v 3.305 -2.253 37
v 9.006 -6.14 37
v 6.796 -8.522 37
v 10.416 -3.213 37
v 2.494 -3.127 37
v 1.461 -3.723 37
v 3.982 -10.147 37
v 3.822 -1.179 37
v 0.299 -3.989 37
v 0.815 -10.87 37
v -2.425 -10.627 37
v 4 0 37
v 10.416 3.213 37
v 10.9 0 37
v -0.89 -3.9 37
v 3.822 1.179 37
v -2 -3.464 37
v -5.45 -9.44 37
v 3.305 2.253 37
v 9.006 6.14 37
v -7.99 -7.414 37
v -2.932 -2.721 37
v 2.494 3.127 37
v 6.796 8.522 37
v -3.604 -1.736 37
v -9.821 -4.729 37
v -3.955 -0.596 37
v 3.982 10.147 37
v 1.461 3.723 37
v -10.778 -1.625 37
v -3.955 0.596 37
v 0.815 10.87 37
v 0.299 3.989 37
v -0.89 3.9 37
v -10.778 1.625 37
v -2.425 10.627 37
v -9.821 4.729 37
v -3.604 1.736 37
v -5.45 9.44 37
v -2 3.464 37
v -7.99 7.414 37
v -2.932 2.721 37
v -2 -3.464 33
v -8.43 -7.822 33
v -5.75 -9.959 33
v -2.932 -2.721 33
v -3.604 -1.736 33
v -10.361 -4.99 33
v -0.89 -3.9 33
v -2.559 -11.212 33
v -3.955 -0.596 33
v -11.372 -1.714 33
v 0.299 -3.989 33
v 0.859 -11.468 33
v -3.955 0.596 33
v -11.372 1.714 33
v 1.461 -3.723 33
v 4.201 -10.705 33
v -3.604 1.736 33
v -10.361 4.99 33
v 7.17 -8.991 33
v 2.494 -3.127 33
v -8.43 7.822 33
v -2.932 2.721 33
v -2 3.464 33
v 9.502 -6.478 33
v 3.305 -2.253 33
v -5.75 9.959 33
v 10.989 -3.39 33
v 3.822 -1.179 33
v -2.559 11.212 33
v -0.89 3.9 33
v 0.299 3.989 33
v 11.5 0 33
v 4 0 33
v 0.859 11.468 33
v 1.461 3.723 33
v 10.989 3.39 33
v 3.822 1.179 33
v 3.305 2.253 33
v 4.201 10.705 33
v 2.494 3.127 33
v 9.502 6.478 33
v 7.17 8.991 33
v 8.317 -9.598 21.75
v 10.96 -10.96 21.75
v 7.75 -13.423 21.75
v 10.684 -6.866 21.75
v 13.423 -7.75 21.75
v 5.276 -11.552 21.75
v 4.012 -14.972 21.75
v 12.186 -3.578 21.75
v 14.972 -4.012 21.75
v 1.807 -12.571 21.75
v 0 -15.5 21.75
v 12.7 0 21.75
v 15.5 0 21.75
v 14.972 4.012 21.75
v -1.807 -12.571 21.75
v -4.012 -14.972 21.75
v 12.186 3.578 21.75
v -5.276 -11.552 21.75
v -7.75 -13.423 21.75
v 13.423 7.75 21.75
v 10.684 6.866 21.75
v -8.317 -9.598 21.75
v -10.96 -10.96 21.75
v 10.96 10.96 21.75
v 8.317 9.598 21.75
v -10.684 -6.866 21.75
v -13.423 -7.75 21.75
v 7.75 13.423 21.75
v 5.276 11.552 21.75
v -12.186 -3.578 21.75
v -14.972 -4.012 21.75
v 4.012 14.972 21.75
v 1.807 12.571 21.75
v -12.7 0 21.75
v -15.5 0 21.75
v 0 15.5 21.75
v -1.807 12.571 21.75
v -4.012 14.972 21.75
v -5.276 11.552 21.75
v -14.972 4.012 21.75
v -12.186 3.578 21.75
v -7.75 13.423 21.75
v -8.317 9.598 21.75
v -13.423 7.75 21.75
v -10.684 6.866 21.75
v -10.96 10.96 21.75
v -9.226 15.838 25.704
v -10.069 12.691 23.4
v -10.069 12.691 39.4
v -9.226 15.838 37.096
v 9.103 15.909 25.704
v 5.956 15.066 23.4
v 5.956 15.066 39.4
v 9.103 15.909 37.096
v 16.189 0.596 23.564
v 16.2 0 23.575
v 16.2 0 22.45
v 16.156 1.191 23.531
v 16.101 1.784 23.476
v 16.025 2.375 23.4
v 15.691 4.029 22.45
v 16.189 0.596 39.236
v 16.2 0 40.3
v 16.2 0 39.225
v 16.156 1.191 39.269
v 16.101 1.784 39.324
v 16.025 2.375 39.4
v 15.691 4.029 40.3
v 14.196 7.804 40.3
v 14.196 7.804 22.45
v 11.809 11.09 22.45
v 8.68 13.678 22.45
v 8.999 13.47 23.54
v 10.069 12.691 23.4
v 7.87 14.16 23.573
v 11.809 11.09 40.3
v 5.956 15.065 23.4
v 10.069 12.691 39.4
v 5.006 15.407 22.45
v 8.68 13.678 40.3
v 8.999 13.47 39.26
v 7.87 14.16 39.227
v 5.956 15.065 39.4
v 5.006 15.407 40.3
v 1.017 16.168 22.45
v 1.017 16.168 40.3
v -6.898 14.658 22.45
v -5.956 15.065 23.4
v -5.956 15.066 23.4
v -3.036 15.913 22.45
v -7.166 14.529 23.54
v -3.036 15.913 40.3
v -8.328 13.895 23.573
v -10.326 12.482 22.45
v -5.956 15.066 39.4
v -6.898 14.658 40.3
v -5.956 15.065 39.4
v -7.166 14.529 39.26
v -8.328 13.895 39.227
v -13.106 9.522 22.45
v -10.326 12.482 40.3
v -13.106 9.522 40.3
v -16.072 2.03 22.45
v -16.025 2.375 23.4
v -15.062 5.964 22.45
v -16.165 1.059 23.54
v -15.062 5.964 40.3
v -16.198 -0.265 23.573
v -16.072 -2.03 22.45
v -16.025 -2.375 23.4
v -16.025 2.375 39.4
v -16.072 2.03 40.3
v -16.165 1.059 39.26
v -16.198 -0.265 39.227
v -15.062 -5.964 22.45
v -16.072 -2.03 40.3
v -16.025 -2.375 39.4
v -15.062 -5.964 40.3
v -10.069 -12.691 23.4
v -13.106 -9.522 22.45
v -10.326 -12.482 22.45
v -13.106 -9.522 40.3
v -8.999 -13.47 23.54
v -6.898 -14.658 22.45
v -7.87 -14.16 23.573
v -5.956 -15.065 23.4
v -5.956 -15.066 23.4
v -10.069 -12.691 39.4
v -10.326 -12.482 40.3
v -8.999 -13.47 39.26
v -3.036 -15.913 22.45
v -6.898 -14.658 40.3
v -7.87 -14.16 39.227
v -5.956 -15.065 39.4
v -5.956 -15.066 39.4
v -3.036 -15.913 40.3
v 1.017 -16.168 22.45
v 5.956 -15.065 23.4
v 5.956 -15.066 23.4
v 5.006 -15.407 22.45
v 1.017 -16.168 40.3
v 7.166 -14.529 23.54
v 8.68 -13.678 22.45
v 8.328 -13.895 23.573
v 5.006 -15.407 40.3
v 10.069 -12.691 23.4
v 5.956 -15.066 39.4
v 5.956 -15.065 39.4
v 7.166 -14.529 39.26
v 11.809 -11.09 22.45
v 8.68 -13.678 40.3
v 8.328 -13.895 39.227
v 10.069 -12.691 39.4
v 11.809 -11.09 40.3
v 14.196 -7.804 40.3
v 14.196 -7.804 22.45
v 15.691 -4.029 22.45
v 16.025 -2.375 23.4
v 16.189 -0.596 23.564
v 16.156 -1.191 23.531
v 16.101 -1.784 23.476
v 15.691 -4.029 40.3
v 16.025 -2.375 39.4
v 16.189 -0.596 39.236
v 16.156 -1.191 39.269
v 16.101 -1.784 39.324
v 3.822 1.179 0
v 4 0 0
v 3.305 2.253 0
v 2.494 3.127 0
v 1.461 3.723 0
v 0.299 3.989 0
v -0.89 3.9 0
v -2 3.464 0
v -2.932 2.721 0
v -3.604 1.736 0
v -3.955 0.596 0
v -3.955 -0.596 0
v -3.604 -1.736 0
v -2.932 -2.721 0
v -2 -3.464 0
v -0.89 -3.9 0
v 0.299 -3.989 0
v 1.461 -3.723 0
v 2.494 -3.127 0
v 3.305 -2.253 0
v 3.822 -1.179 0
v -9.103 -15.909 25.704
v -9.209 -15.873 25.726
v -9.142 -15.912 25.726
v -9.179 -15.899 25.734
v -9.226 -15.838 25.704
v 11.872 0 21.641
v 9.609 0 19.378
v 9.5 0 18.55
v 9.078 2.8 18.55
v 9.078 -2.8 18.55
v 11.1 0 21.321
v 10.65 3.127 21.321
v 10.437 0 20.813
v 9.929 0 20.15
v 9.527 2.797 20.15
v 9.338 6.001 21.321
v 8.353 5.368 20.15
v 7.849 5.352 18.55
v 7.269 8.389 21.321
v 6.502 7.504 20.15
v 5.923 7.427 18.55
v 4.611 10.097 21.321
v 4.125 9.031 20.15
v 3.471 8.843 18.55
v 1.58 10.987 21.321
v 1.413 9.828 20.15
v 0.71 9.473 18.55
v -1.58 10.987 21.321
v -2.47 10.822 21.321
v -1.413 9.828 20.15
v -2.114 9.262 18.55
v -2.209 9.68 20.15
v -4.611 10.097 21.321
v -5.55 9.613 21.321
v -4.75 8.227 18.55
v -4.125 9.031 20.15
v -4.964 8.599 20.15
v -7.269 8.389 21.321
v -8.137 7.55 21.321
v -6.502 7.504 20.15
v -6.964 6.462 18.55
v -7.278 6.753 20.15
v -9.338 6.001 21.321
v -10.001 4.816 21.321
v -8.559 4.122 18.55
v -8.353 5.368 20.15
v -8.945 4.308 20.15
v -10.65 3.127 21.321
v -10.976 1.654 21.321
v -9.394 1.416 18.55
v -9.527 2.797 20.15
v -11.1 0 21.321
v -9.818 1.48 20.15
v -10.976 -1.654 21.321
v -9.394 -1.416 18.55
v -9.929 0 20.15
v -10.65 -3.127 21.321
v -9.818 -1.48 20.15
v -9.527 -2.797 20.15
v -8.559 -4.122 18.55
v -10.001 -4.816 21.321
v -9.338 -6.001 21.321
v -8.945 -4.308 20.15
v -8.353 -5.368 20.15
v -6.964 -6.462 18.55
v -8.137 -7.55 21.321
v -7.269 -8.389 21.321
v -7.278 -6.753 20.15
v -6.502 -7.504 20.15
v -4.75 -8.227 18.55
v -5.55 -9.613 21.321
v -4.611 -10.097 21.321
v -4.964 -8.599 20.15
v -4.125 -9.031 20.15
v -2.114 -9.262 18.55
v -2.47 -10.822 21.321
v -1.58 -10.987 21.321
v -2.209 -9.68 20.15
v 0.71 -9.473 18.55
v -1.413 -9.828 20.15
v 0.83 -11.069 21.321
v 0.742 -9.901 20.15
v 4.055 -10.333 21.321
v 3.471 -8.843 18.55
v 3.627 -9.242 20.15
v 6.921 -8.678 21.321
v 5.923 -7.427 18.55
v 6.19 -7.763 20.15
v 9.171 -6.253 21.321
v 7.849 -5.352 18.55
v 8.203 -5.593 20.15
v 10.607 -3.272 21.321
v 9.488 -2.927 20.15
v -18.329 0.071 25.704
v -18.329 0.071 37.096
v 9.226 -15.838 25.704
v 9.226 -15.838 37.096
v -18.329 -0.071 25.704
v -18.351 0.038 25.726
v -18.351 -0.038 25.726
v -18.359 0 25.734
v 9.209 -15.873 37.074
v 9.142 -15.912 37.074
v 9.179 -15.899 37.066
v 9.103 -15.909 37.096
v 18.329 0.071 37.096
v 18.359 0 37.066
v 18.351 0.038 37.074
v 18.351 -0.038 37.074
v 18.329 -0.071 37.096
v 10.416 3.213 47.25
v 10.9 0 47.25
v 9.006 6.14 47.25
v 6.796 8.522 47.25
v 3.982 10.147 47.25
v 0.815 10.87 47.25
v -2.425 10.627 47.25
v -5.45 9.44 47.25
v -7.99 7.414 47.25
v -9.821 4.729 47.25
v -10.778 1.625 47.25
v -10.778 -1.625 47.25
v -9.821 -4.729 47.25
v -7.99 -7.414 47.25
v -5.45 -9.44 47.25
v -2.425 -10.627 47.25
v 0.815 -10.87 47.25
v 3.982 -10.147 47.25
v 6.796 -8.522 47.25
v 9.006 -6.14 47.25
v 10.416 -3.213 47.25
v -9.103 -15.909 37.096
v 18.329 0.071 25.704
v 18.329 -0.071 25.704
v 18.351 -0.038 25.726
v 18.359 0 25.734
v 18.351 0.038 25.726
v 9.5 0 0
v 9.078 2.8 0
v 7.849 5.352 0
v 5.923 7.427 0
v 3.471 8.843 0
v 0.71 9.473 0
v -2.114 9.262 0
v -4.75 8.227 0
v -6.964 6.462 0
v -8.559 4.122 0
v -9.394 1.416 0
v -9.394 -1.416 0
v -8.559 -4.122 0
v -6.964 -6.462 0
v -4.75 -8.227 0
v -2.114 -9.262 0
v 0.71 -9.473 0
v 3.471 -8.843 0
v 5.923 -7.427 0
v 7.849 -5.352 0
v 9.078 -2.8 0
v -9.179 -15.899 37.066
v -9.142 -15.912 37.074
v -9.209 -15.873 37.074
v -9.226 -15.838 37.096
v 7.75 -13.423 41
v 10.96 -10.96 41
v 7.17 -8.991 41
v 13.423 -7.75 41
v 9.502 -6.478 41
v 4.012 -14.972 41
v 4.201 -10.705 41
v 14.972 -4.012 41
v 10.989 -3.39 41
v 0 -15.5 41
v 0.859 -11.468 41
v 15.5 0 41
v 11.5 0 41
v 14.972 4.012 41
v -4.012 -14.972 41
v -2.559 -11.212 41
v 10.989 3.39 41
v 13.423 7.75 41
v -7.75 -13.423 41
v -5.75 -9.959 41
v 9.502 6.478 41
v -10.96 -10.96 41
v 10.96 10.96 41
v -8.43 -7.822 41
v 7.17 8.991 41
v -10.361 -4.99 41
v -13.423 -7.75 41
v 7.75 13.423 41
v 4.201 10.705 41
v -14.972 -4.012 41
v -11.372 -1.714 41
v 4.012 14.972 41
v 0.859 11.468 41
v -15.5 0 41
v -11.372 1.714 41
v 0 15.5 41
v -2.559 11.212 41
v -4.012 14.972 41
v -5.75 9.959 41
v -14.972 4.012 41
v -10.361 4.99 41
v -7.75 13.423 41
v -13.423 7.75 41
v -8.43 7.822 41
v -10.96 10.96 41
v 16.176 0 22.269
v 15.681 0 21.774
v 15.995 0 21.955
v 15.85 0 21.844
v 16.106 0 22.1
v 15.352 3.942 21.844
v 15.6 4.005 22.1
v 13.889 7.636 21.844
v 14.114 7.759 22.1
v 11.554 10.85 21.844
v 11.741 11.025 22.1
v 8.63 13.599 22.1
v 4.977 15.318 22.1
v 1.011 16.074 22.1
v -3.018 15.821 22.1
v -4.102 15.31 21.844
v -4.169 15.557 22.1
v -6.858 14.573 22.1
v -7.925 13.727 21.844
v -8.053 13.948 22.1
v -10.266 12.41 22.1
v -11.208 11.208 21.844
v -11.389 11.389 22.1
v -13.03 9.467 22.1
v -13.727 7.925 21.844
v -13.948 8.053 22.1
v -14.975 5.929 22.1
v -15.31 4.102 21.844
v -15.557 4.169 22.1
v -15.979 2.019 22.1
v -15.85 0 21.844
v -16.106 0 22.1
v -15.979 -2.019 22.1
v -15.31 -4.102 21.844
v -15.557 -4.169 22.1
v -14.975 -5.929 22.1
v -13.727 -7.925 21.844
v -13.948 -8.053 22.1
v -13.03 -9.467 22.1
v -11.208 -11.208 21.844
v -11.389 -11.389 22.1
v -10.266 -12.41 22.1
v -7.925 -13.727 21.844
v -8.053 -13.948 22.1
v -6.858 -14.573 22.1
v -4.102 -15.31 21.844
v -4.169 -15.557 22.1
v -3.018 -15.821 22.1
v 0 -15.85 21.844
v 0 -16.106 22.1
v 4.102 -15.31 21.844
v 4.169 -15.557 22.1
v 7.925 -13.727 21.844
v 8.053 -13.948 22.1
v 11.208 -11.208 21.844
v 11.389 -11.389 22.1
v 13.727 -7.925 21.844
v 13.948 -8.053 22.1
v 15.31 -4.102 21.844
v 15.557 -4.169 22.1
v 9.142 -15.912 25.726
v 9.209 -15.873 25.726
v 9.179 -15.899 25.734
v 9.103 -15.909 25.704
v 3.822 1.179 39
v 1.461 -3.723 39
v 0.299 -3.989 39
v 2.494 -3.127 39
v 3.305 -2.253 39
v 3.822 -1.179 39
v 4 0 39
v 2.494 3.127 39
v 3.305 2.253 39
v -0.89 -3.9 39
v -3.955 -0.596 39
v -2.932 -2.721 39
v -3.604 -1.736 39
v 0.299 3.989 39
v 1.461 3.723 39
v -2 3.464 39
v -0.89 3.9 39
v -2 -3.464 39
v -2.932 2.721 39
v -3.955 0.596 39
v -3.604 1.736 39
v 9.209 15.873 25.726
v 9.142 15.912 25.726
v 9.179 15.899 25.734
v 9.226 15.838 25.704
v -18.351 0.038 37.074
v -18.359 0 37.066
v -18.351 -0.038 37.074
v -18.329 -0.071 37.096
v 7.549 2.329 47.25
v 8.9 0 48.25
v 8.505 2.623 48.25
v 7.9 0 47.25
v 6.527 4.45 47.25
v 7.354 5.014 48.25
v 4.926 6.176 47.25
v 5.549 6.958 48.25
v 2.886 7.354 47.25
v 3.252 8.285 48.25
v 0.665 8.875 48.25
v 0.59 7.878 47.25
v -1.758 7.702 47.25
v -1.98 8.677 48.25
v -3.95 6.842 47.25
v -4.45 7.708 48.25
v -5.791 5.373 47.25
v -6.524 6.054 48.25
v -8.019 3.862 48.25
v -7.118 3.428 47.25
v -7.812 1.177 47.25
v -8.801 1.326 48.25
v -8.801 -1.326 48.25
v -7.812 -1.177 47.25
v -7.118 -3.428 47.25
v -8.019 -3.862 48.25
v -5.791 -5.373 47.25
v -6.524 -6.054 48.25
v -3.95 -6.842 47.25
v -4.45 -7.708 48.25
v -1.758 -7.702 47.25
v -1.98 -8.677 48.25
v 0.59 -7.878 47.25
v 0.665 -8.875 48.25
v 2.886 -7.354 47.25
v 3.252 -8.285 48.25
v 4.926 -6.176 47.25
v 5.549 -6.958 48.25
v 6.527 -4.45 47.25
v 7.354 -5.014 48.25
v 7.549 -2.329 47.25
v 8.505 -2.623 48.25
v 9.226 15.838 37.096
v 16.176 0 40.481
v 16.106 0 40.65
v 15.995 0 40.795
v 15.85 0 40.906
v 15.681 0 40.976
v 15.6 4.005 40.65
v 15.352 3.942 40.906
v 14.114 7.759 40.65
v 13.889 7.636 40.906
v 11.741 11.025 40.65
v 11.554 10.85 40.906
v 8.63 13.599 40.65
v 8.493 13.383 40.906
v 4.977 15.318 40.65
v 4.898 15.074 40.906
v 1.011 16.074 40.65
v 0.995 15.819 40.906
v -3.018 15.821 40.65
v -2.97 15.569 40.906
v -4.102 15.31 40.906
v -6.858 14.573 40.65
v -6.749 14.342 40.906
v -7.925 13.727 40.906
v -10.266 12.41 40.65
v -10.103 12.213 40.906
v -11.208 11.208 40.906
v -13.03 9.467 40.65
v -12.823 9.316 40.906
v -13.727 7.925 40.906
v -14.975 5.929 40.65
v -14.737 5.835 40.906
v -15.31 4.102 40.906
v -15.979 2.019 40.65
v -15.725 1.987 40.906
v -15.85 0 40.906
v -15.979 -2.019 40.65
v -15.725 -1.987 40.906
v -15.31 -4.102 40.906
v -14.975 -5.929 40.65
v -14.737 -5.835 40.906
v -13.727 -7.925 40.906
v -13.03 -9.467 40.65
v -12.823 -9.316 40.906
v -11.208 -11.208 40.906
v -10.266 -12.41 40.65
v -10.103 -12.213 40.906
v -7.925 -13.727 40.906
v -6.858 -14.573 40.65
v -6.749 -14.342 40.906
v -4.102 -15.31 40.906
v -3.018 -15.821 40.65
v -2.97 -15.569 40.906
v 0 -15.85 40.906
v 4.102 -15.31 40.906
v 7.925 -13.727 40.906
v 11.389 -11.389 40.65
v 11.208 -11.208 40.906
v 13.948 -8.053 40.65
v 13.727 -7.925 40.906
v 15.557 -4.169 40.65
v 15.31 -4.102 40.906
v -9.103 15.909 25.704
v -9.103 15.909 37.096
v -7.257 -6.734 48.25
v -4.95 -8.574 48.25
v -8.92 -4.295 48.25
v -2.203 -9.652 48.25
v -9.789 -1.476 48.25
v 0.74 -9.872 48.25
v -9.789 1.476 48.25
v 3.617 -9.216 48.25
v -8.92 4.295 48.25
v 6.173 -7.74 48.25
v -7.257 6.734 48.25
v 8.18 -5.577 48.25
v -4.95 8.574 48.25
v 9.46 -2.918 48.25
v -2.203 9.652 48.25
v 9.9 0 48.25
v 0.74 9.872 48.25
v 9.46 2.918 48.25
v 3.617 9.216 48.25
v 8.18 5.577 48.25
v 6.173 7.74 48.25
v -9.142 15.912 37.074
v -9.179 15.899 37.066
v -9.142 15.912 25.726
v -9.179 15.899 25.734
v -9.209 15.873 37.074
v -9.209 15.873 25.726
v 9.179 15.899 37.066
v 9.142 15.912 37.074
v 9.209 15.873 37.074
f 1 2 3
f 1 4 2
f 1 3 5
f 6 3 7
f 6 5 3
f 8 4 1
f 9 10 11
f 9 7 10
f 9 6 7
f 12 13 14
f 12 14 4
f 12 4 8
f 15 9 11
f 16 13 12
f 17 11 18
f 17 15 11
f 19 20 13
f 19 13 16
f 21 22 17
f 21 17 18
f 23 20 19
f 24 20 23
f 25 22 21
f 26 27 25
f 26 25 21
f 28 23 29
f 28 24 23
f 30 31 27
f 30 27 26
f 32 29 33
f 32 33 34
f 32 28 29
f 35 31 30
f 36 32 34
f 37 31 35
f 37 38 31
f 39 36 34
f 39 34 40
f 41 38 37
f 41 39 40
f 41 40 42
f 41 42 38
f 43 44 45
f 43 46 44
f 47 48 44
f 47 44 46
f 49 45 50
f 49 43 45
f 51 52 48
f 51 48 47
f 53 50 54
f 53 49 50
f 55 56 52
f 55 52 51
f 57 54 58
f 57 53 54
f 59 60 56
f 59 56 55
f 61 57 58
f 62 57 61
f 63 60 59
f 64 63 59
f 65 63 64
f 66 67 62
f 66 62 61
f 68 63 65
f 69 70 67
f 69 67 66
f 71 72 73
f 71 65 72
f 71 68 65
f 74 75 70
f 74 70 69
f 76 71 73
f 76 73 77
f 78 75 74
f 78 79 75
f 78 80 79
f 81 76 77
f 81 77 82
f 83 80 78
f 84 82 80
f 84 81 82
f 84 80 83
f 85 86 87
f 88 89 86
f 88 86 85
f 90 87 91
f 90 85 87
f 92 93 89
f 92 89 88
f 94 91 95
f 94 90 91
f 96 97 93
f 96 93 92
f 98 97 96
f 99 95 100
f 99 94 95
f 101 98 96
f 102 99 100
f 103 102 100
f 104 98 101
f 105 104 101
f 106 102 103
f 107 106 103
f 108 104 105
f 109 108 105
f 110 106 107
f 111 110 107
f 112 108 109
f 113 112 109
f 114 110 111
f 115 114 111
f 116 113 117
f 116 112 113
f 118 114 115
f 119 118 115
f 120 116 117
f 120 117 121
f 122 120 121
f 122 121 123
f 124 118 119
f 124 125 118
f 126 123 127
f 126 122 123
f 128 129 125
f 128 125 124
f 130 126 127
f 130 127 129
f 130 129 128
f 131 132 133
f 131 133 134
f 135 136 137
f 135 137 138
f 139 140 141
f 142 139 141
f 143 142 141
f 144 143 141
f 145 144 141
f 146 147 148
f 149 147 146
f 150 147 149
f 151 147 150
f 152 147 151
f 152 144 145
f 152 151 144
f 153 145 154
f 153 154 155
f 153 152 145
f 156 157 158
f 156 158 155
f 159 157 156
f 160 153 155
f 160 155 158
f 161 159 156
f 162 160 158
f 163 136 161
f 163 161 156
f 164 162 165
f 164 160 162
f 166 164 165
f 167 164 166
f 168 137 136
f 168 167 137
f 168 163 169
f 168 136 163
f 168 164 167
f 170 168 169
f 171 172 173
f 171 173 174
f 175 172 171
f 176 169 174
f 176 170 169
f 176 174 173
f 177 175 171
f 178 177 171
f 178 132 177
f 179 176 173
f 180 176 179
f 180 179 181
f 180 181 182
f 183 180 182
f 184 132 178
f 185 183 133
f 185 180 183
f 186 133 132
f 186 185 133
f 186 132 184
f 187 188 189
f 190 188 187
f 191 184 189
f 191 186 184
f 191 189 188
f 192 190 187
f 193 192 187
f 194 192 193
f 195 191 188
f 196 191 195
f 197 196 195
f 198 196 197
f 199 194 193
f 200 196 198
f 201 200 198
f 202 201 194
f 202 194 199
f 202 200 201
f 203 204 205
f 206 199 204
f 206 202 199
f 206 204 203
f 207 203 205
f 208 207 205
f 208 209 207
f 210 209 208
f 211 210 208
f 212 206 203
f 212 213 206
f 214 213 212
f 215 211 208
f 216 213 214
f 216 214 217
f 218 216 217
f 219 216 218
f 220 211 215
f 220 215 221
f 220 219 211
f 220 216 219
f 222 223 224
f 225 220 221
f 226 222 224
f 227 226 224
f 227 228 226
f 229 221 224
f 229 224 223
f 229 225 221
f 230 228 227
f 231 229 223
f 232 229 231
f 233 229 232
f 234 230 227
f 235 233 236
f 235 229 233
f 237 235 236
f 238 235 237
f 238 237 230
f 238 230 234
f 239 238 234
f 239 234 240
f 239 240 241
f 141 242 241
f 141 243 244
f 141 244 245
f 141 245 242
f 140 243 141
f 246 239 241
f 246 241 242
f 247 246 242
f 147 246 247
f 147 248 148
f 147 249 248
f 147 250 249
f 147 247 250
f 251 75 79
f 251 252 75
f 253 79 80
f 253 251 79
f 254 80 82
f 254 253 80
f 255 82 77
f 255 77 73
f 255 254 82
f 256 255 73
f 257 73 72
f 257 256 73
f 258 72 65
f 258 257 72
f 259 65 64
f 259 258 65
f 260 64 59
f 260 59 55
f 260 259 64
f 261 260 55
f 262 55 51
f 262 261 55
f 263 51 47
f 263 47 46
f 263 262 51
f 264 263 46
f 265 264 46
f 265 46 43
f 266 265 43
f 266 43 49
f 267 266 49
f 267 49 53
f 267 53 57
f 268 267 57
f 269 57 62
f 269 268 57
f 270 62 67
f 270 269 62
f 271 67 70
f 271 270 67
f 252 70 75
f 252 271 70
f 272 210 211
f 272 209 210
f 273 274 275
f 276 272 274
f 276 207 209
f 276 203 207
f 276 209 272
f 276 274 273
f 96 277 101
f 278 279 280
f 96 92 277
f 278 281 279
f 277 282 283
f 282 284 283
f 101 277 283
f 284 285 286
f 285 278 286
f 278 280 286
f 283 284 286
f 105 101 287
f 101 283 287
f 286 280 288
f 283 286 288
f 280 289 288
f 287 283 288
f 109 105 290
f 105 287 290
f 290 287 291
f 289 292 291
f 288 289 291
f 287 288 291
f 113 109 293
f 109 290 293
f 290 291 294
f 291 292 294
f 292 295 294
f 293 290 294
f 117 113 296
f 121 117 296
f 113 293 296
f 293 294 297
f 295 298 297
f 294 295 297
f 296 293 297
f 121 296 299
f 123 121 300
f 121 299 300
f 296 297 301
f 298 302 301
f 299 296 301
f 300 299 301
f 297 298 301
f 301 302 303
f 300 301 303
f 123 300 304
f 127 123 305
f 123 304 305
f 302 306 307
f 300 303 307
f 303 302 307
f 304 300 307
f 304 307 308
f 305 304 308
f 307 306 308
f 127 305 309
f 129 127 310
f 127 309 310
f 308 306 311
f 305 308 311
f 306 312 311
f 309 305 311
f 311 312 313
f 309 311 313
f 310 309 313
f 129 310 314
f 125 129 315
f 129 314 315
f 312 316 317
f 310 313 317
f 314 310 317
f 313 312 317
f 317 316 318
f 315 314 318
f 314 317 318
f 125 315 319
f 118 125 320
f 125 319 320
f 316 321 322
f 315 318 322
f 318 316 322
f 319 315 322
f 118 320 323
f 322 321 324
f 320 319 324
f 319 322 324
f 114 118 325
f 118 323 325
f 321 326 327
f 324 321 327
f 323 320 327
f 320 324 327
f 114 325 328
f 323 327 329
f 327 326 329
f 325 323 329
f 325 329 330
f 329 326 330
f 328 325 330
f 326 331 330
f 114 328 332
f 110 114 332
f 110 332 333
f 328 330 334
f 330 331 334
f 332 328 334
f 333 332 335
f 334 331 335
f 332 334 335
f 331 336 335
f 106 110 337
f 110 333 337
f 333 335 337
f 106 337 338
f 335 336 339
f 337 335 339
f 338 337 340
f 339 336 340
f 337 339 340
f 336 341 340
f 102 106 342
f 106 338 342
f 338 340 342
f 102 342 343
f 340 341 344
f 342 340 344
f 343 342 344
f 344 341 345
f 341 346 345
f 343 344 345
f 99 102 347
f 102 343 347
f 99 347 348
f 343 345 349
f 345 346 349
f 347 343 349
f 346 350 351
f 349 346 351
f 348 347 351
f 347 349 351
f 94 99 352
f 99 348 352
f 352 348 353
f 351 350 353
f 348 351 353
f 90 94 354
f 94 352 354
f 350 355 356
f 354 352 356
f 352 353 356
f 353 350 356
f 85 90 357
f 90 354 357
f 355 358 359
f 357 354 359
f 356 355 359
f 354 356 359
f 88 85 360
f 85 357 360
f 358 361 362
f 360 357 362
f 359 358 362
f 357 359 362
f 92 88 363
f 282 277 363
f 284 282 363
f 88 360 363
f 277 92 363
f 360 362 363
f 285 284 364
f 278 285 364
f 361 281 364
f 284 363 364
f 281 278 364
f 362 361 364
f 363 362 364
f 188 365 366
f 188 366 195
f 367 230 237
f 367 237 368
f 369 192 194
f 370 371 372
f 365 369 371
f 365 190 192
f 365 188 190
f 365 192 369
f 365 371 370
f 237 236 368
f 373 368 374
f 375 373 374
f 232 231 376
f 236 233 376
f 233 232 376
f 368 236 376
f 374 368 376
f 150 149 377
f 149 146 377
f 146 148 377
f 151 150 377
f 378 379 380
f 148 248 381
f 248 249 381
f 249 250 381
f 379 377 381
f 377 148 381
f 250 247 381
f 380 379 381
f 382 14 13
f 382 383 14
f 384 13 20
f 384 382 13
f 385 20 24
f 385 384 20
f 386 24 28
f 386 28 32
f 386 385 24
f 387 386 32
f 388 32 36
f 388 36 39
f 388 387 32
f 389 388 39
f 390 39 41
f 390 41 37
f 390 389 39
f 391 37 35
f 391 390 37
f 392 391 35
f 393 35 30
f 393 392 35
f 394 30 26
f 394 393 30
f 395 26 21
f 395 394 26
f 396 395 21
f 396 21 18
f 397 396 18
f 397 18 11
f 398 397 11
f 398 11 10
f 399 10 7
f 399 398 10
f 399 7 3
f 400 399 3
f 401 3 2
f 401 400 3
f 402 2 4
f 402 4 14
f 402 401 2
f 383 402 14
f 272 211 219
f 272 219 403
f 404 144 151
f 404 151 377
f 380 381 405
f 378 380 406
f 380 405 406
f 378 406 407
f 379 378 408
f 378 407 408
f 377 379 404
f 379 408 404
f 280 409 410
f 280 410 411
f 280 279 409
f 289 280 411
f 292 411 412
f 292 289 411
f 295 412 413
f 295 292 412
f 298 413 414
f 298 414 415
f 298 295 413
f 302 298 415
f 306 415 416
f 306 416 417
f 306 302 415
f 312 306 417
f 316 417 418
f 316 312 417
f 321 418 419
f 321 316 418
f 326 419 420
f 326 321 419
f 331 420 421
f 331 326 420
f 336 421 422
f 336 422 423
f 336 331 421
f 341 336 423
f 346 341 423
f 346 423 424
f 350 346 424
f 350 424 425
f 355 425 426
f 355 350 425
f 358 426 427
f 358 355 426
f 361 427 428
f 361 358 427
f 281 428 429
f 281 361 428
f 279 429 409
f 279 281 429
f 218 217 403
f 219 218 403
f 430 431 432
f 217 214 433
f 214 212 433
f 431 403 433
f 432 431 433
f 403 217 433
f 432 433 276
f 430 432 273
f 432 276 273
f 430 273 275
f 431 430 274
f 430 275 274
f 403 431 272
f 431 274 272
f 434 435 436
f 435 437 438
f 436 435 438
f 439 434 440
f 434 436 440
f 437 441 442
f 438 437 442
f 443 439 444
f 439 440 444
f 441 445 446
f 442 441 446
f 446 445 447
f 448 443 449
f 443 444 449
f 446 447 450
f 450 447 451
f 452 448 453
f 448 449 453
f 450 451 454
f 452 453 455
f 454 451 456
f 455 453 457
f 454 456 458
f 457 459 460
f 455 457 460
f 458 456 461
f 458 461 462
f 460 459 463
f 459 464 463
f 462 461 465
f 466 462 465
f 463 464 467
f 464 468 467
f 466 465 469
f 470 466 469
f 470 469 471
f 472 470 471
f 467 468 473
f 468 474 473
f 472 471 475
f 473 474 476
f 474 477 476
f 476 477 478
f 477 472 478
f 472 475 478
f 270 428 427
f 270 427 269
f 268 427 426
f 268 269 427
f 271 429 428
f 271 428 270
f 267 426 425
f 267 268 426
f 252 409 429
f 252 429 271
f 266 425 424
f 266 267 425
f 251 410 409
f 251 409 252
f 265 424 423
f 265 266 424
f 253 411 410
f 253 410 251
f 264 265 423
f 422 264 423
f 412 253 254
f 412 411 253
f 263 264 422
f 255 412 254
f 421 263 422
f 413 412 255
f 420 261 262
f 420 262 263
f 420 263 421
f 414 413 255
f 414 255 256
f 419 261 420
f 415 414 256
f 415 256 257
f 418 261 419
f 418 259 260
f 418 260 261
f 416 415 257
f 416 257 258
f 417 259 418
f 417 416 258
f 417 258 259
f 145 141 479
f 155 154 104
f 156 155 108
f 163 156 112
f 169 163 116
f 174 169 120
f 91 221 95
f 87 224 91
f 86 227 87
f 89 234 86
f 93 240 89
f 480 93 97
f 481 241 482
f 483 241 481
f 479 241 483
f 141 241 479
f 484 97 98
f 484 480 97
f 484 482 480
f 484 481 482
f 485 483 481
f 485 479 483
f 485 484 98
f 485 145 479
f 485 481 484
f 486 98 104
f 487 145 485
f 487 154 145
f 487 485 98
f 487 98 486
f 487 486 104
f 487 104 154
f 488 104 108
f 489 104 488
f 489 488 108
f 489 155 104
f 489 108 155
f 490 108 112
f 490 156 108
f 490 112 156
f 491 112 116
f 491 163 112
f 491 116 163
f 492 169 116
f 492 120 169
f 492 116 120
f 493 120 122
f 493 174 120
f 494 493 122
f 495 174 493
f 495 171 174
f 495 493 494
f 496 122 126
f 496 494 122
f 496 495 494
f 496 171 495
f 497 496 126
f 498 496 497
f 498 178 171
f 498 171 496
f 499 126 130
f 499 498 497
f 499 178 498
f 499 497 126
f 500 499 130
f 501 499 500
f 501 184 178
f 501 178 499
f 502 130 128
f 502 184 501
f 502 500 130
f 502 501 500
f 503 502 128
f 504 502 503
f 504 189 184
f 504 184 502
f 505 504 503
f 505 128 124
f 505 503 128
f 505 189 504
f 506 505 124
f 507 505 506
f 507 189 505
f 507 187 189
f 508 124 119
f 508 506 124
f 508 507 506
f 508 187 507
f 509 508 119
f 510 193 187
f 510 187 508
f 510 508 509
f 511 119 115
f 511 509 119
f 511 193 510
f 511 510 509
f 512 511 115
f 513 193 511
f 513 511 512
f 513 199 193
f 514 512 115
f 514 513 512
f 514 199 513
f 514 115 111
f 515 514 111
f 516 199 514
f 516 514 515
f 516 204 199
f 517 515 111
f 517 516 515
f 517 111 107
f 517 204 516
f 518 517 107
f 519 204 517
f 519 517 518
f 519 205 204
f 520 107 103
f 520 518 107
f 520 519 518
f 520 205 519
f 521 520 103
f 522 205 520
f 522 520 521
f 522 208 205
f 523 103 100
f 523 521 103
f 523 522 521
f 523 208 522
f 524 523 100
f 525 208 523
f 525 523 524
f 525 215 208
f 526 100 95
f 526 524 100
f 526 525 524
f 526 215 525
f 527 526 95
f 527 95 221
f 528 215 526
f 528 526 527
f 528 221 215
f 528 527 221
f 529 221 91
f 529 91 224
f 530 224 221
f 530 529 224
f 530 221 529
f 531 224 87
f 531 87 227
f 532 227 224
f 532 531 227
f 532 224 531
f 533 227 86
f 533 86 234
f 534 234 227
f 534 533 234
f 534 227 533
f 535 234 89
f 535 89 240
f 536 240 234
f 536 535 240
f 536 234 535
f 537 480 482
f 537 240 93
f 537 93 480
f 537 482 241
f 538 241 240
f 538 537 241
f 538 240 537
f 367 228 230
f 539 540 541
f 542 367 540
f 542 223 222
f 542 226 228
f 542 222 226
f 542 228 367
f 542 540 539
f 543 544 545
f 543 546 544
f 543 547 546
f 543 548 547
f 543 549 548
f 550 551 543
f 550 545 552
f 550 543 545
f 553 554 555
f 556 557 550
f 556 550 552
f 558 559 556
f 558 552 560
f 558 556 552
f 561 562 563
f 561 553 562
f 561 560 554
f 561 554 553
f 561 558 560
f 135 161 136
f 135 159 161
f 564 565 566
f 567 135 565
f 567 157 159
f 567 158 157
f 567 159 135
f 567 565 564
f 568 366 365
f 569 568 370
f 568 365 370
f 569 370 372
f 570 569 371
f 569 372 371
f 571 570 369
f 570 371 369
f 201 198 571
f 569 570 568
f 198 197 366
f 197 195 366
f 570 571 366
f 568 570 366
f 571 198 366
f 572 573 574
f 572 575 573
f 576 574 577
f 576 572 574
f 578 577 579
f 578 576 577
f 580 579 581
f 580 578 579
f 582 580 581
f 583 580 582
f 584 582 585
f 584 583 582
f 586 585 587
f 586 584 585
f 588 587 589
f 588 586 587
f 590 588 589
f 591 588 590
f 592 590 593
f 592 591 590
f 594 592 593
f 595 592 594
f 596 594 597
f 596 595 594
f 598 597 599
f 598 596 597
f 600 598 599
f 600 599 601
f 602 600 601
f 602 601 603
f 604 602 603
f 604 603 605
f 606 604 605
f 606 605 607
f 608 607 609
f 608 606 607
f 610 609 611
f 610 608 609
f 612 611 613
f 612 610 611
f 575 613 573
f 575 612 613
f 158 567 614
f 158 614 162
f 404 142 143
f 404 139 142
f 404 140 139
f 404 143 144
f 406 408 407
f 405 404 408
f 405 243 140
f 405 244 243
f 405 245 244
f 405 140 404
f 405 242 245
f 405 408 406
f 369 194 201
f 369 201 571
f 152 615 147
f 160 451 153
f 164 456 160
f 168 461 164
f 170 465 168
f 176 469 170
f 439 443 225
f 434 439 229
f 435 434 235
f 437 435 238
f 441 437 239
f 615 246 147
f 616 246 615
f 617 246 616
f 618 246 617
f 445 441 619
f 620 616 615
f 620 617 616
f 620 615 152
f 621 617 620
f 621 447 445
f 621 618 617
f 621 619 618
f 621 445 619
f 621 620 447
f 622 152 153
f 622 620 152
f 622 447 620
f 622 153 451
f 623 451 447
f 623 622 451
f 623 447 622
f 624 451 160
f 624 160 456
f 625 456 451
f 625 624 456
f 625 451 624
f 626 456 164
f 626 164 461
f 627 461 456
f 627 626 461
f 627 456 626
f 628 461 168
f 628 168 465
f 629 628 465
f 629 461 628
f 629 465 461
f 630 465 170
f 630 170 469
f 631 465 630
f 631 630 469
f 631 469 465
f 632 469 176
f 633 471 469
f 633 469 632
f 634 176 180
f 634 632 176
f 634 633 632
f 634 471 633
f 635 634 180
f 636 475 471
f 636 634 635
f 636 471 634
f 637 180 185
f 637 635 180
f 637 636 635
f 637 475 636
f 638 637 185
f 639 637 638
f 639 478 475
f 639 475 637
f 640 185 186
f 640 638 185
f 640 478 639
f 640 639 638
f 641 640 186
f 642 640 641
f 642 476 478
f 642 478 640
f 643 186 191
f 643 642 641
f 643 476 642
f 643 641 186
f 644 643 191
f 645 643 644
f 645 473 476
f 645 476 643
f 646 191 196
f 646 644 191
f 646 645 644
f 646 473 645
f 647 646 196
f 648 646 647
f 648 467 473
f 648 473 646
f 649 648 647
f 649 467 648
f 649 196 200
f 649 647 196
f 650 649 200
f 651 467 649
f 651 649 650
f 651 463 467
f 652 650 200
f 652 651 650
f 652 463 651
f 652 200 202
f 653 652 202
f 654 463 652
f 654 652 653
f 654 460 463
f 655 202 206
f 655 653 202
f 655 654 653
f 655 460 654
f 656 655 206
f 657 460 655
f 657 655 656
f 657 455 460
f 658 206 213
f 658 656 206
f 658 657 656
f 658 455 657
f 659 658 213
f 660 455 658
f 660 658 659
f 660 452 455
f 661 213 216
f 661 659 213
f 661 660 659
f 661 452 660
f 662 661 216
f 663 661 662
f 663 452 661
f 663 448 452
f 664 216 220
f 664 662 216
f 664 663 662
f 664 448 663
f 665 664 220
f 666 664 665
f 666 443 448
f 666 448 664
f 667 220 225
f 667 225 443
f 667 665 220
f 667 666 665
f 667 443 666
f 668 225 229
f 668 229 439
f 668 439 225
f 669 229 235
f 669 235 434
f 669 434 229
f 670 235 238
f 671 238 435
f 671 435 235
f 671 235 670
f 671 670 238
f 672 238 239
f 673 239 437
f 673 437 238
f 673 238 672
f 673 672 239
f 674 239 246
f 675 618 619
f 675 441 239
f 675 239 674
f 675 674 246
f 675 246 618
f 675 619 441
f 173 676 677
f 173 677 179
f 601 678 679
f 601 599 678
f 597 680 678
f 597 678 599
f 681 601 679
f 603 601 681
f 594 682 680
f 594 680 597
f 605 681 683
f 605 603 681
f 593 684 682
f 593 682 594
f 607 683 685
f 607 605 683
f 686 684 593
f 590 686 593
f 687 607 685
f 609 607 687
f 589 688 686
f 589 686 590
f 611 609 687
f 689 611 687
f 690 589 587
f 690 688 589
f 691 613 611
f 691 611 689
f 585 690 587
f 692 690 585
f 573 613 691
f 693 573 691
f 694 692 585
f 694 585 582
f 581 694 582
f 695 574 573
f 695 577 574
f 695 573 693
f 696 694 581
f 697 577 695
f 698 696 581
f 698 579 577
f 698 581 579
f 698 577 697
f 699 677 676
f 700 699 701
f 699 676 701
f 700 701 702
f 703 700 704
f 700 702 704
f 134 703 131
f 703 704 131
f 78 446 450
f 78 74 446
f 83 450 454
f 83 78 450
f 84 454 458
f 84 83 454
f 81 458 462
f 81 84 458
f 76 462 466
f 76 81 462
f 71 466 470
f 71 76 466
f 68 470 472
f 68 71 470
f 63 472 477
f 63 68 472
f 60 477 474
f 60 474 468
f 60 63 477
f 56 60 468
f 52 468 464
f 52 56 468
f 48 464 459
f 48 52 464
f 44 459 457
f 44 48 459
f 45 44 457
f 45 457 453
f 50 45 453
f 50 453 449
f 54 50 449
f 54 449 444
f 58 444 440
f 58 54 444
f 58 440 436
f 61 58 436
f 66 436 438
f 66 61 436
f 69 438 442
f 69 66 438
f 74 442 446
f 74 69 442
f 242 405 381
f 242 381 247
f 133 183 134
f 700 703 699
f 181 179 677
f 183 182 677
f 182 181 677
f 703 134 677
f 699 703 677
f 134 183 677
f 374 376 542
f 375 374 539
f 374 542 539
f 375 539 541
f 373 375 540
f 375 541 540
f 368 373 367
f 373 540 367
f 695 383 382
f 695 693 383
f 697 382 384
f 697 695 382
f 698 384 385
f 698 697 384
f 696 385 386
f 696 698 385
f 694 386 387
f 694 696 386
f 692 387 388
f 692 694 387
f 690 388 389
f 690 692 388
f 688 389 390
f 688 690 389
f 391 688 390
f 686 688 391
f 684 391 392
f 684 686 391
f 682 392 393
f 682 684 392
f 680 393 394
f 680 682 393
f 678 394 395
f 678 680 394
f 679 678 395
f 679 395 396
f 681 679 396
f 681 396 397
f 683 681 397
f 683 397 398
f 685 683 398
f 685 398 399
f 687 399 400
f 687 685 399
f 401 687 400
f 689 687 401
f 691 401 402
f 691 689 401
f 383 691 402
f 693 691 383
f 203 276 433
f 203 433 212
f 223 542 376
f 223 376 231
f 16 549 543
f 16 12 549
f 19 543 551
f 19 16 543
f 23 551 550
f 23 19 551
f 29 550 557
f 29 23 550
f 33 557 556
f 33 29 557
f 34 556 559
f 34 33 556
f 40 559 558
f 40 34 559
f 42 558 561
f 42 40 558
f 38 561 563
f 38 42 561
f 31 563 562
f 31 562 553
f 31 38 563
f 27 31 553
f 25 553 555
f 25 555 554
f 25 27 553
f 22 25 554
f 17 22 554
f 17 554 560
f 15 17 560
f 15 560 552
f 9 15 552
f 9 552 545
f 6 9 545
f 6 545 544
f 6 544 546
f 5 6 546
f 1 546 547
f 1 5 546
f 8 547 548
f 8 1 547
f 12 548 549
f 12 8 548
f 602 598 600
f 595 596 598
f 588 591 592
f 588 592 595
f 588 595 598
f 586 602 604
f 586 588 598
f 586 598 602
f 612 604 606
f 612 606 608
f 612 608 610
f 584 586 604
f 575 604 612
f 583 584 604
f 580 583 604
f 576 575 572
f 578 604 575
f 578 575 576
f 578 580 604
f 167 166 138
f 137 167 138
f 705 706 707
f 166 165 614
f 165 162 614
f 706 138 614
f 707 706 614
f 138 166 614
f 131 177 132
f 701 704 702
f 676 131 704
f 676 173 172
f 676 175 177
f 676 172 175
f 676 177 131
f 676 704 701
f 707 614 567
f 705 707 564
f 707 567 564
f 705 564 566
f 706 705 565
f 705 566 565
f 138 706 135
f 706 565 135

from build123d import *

# Parameters (mm, degrees)
PAD001_DEPTH      = 3
PAD001_DEPTH_BACK = 3
PAD_DEPTH         = 16
ARRAY_COUNT       = 6


with BuildPart() as revolution_button:
    # Sketch001 → Revolution001 (revolve)
    with BuildSketch(Plane.XZ):
        Polygon((0, 47.25), (0, 39), (4, 39), (4, 37), (10.9, 37), (10.9, 47.25), (9.9, 48.25), (8.9, 48.25), (7.9, 47.25), align=None)
    revolve(axis=Axis((0, 0, 0), (0, 0, 1)))


with BuildPart() as revolution_outer:
    # Sketch → Revolution (revolve)
    with BuildSketch(Plane.XZ):
        with BuildLine():
            Line((9.5, 0), (9.5, 18.55))
            ThreePointArc((12.7, 21.75), (10.437258, 20.812742), (9.5, 18.55))
            Line((12.7, 21.75), (15.5, 21.75))
            ThreePointArc((15.5, 21.75), (15.994975, 21.955025), (16.2, 22.45))
            Line((16.2, 22.45), (16.2, 40.3))
            ThreePointArc((16.2, 40.3), (15.994975, 40.794975), (15.5, 41))
            Line((11.5, 41), (15.5, 41))
            Line((11.5, 41), (11.5, 33))
            Line((11.5, 33), (4, 33))
            Line((4, 33), (4, 0))
            Line((4, 0), (9.5, 0))
        make_face()
    revolve(axis=Axis((0, 0, 0), (0, 0, 1)))


with BuildPart() as pad_grip_draft:
    # Sketch003 → Pad001 (new body, two sides)
    with BuildSketch(Plane.XZ) as pad001_sk:
        Polygon((16.025, 39.4), (18.425, 37), (18.425, 39.4), align=None)
        Polygon((16.025, 23.4), (18.425, 25.8), (18.425, 23.4), align=None)
    extrude(amount=PAD001_DEPTH)
    extrude(pad001_sk.sketch, amount=-PAD001_DEPTH_BACK)


with BuildPart() as fusion_knob:
    # Sketch002 → Pad (new body)
    with BuildSketch(Plane.XY.offset(23.4)):
        with BuildLine():
            Line((16.024961, 2.375), (18.329251, 0.07071))
            ThreePointArc((18.329251, -0.07071), (18.35854, 0), (18.329251, 0.07071))
            Line((18.329251, -0.07071), (16.024961, -2.375))
            Line((16.024961, 2.375), (16.024961, -2.375))
        make_face()
    extrude(amount=PAD_DEPTH)

    # Cut: cut Pad (grip draft)
    add(pad_grip_draft.part, mode=Mode.SUBTRACT)

    # Array: Fusion (knob) ×6 about axis
    array_axis = Axis((0, 0, 0), (0, 0, 1))


with BuildPart() as fusion_knob_1:
    add(fusion_knob.part)
    for i in range(1, ARRAY_COUNT):
        add(fusion_knob.part.rotate(array_axis, i * 360 / ARRAY_COUNT))

    # Fusion: union Revolution (outer)
    add(revolution_outer.part)


solid = Compound([revolution_button.part, fusion_knob_1.part])
